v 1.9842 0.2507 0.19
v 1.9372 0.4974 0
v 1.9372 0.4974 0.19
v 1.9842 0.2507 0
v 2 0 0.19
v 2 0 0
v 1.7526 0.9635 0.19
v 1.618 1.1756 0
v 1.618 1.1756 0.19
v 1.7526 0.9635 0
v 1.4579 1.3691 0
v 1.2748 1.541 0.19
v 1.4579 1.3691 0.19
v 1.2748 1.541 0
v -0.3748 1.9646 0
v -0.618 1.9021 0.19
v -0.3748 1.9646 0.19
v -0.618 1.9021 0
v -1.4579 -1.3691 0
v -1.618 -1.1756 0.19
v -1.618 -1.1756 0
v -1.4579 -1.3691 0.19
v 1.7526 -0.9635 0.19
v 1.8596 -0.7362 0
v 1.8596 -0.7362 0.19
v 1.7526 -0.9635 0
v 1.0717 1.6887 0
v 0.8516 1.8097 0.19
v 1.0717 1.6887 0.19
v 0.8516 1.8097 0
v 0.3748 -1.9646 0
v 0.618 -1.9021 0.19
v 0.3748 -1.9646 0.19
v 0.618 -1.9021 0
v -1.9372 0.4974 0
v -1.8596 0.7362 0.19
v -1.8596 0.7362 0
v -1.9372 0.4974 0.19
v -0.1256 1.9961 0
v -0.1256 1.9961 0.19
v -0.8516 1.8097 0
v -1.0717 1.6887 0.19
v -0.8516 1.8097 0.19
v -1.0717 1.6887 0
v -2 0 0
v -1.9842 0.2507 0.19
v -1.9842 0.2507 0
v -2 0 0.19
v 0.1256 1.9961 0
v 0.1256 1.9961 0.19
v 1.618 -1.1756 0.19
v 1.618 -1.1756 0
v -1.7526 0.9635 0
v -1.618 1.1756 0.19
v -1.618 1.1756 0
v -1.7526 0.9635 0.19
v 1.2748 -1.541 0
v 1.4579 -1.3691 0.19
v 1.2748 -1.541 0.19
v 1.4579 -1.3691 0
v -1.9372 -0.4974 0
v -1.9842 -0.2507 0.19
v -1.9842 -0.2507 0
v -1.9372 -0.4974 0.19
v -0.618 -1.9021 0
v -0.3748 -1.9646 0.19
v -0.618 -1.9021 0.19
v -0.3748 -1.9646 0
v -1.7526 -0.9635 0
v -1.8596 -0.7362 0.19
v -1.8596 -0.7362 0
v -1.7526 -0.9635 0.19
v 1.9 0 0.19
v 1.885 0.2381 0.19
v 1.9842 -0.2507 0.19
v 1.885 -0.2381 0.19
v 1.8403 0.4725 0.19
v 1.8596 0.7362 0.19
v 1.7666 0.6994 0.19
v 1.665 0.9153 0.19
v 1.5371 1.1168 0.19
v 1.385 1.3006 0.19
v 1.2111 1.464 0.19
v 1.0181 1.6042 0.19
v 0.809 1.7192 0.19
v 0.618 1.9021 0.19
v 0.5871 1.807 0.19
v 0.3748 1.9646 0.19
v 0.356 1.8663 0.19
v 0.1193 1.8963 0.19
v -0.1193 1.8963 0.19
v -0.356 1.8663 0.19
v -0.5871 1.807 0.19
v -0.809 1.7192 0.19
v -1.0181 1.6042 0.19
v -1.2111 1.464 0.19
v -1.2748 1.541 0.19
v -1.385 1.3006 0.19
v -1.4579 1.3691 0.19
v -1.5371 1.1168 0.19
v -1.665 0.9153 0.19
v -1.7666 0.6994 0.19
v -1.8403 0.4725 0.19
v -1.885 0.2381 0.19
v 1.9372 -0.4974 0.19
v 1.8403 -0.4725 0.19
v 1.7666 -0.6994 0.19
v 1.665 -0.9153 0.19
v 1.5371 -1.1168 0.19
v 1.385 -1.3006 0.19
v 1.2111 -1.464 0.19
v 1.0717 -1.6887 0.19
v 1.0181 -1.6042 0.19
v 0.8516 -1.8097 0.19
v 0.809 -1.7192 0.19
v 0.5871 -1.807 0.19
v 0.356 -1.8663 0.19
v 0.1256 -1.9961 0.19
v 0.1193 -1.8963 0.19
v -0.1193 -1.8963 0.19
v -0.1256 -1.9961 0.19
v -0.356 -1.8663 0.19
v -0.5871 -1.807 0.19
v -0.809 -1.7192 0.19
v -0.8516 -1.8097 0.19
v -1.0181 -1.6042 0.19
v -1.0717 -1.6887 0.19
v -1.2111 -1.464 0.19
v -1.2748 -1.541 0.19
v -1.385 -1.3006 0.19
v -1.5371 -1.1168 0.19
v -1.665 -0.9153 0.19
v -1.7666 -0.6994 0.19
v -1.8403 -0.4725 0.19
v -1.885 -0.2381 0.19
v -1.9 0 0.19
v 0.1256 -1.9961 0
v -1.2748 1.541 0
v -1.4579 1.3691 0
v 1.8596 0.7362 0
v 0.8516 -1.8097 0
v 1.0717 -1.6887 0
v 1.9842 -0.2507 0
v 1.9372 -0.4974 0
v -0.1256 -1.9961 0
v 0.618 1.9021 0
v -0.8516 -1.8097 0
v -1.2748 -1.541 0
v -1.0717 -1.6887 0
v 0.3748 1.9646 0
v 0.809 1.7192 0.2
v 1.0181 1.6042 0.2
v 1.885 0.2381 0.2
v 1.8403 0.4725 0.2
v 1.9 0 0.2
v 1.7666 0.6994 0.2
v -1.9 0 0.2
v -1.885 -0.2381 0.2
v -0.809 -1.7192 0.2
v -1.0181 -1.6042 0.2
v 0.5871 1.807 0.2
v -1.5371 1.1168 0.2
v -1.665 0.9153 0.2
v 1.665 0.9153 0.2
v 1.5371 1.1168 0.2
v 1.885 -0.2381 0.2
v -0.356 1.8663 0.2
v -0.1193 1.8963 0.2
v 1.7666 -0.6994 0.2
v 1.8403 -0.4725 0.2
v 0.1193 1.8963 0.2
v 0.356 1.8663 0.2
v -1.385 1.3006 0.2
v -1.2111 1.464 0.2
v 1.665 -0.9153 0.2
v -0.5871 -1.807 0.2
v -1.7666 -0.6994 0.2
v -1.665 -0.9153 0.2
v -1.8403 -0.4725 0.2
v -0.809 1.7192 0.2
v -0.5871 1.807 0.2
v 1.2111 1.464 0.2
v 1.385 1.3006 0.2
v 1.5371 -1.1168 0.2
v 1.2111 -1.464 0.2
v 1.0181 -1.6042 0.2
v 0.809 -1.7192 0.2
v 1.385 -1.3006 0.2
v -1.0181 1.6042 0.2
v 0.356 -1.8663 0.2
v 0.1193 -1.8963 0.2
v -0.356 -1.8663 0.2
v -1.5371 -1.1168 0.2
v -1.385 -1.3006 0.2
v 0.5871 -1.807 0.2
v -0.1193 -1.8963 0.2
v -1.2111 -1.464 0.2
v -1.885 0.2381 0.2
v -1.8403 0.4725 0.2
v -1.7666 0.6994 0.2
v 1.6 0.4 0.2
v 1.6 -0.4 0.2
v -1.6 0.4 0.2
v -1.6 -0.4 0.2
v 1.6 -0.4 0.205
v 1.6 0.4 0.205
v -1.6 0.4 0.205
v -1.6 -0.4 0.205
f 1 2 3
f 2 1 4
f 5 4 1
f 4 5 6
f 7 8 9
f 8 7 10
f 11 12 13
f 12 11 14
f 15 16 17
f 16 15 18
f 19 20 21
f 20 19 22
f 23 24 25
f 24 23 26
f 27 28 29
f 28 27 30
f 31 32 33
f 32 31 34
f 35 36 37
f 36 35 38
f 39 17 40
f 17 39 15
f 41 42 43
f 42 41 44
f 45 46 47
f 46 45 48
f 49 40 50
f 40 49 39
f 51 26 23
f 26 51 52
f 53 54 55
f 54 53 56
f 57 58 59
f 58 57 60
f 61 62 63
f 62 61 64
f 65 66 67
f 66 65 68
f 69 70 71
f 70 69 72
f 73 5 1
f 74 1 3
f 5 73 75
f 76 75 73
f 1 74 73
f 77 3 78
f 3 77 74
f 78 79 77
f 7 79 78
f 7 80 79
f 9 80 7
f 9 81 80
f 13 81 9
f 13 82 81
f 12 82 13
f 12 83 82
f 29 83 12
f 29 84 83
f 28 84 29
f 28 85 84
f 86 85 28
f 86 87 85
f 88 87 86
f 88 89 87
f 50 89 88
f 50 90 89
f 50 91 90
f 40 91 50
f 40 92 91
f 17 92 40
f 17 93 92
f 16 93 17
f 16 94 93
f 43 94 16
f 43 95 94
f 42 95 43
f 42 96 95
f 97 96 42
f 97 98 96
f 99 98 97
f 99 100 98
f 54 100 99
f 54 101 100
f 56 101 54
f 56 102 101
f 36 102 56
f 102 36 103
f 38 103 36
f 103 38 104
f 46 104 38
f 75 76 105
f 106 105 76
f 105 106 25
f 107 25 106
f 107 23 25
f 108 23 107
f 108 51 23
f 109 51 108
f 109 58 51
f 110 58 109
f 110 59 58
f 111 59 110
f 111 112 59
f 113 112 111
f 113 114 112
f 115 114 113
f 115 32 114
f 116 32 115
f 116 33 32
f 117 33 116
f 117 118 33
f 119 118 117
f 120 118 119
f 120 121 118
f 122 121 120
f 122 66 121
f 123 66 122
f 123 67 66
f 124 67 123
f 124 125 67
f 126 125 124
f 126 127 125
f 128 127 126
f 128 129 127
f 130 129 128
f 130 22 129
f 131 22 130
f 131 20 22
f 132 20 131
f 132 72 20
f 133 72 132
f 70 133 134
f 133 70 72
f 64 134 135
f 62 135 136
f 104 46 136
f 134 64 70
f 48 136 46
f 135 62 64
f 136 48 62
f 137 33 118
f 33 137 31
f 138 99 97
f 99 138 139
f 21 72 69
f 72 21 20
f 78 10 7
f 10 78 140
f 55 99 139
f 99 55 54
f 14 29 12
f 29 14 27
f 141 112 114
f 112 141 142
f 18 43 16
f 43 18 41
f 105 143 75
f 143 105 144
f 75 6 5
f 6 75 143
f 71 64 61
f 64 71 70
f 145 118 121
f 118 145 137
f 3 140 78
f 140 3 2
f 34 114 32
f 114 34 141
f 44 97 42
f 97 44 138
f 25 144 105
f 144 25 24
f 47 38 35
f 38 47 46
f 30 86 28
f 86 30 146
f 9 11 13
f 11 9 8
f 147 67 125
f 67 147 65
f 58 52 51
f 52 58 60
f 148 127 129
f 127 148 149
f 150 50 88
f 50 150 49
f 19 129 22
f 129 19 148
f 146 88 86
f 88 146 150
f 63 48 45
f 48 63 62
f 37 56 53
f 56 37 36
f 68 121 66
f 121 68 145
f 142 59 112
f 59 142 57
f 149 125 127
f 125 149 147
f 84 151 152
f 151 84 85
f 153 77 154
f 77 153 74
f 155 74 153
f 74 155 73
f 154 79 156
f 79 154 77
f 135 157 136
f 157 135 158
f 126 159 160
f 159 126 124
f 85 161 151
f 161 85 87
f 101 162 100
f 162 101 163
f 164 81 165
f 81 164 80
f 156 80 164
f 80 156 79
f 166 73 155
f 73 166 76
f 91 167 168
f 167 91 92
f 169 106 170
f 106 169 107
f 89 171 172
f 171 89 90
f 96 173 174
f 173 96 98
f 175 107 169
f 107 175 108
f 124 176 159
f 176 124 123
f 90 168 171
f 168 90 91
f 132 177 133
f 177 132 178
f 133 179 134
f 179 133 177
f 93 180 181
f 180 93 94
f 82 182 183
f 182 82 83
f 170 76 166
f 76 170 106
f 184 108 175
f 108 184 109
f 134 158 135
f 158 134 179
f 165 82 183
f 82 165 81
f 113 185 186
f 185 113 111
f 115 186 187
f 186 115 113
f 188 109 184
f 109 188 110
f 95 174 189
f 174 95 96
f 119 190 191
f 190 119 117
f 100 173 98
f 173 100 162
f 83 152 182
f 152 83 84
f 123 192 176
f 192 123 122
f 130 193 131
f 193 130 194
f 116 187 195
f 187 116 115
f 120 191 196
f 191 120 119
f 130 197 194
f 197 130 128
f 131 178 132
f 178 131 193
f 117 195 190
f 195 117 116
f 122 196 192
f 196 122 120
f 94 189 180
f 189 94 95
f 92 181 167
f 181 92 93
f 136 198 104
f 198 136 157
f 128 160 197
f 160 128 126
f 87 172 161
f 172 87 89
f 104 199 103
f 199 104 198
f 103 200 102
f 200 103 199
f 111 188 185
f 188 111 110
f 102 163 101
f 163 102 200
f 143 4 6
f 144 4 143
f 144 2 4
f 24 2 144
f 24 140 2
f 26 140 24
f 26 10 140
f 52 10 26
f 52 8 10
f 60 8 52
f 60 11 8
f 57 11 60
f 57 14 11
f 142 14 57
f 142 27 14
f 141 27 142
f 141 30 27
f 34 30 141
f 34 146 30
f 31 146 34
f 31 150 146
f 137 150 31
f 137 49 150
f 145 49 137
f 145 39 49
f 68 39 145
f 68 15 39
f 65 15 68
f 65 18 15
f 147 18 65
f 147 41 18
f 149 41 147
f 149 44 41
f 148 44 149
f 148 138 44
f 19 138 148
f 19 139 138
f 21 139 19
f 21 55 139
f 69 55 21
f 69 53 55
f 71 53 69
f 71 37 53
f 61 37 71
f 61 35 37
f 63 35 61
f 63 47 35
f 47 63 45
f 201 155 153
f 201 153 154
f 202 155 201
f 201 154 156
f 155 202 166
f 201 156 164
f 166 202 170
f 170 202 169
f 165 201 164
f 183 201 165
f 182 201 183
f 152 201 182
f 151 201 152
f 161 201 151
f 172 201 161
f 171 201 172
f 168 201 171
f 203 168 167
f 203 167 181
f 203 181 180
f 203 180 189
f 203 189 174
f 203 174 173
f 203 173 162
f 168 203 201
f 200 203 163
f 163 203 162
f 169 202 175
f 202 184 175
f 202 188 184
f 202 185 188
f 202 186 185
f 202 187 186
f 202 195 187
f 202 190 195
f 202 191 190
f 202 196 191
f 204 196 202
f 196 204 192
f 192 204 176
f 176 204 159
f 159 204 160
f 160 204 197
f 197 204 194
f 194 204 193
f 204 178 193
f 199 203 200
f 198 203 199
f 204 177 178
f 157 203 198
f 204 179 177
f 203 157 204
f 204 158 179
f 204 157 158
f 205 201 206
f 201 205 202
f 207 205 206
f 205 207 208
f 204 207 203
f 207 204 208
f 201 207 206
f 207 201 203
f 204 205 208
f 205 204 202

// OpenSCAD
Red_Size = 1.5;


color("gray")
cylinder(h = 0.1, r1 = 2,r2 = 2,$fn = 50);

translate([0,0,0.1])
difference(){
color("red")
cylinder(h = 0.1, r1 = 1.9,r2 = 1.9,$fn = 50);


}


translate([0,0,0.09])
difference(){
color("white")
cylinder(h = 0.1, r1 = 2,r2 = 2,$fn = 50);
cylinder(h = 0.2, r1 = 1.9,r2 = 1.9,$fn = 50);

}

color("white")
translate([0,0,0.09])
translate([0,0,0.09])
cube([3.2,0.8,0.05], center = true);
